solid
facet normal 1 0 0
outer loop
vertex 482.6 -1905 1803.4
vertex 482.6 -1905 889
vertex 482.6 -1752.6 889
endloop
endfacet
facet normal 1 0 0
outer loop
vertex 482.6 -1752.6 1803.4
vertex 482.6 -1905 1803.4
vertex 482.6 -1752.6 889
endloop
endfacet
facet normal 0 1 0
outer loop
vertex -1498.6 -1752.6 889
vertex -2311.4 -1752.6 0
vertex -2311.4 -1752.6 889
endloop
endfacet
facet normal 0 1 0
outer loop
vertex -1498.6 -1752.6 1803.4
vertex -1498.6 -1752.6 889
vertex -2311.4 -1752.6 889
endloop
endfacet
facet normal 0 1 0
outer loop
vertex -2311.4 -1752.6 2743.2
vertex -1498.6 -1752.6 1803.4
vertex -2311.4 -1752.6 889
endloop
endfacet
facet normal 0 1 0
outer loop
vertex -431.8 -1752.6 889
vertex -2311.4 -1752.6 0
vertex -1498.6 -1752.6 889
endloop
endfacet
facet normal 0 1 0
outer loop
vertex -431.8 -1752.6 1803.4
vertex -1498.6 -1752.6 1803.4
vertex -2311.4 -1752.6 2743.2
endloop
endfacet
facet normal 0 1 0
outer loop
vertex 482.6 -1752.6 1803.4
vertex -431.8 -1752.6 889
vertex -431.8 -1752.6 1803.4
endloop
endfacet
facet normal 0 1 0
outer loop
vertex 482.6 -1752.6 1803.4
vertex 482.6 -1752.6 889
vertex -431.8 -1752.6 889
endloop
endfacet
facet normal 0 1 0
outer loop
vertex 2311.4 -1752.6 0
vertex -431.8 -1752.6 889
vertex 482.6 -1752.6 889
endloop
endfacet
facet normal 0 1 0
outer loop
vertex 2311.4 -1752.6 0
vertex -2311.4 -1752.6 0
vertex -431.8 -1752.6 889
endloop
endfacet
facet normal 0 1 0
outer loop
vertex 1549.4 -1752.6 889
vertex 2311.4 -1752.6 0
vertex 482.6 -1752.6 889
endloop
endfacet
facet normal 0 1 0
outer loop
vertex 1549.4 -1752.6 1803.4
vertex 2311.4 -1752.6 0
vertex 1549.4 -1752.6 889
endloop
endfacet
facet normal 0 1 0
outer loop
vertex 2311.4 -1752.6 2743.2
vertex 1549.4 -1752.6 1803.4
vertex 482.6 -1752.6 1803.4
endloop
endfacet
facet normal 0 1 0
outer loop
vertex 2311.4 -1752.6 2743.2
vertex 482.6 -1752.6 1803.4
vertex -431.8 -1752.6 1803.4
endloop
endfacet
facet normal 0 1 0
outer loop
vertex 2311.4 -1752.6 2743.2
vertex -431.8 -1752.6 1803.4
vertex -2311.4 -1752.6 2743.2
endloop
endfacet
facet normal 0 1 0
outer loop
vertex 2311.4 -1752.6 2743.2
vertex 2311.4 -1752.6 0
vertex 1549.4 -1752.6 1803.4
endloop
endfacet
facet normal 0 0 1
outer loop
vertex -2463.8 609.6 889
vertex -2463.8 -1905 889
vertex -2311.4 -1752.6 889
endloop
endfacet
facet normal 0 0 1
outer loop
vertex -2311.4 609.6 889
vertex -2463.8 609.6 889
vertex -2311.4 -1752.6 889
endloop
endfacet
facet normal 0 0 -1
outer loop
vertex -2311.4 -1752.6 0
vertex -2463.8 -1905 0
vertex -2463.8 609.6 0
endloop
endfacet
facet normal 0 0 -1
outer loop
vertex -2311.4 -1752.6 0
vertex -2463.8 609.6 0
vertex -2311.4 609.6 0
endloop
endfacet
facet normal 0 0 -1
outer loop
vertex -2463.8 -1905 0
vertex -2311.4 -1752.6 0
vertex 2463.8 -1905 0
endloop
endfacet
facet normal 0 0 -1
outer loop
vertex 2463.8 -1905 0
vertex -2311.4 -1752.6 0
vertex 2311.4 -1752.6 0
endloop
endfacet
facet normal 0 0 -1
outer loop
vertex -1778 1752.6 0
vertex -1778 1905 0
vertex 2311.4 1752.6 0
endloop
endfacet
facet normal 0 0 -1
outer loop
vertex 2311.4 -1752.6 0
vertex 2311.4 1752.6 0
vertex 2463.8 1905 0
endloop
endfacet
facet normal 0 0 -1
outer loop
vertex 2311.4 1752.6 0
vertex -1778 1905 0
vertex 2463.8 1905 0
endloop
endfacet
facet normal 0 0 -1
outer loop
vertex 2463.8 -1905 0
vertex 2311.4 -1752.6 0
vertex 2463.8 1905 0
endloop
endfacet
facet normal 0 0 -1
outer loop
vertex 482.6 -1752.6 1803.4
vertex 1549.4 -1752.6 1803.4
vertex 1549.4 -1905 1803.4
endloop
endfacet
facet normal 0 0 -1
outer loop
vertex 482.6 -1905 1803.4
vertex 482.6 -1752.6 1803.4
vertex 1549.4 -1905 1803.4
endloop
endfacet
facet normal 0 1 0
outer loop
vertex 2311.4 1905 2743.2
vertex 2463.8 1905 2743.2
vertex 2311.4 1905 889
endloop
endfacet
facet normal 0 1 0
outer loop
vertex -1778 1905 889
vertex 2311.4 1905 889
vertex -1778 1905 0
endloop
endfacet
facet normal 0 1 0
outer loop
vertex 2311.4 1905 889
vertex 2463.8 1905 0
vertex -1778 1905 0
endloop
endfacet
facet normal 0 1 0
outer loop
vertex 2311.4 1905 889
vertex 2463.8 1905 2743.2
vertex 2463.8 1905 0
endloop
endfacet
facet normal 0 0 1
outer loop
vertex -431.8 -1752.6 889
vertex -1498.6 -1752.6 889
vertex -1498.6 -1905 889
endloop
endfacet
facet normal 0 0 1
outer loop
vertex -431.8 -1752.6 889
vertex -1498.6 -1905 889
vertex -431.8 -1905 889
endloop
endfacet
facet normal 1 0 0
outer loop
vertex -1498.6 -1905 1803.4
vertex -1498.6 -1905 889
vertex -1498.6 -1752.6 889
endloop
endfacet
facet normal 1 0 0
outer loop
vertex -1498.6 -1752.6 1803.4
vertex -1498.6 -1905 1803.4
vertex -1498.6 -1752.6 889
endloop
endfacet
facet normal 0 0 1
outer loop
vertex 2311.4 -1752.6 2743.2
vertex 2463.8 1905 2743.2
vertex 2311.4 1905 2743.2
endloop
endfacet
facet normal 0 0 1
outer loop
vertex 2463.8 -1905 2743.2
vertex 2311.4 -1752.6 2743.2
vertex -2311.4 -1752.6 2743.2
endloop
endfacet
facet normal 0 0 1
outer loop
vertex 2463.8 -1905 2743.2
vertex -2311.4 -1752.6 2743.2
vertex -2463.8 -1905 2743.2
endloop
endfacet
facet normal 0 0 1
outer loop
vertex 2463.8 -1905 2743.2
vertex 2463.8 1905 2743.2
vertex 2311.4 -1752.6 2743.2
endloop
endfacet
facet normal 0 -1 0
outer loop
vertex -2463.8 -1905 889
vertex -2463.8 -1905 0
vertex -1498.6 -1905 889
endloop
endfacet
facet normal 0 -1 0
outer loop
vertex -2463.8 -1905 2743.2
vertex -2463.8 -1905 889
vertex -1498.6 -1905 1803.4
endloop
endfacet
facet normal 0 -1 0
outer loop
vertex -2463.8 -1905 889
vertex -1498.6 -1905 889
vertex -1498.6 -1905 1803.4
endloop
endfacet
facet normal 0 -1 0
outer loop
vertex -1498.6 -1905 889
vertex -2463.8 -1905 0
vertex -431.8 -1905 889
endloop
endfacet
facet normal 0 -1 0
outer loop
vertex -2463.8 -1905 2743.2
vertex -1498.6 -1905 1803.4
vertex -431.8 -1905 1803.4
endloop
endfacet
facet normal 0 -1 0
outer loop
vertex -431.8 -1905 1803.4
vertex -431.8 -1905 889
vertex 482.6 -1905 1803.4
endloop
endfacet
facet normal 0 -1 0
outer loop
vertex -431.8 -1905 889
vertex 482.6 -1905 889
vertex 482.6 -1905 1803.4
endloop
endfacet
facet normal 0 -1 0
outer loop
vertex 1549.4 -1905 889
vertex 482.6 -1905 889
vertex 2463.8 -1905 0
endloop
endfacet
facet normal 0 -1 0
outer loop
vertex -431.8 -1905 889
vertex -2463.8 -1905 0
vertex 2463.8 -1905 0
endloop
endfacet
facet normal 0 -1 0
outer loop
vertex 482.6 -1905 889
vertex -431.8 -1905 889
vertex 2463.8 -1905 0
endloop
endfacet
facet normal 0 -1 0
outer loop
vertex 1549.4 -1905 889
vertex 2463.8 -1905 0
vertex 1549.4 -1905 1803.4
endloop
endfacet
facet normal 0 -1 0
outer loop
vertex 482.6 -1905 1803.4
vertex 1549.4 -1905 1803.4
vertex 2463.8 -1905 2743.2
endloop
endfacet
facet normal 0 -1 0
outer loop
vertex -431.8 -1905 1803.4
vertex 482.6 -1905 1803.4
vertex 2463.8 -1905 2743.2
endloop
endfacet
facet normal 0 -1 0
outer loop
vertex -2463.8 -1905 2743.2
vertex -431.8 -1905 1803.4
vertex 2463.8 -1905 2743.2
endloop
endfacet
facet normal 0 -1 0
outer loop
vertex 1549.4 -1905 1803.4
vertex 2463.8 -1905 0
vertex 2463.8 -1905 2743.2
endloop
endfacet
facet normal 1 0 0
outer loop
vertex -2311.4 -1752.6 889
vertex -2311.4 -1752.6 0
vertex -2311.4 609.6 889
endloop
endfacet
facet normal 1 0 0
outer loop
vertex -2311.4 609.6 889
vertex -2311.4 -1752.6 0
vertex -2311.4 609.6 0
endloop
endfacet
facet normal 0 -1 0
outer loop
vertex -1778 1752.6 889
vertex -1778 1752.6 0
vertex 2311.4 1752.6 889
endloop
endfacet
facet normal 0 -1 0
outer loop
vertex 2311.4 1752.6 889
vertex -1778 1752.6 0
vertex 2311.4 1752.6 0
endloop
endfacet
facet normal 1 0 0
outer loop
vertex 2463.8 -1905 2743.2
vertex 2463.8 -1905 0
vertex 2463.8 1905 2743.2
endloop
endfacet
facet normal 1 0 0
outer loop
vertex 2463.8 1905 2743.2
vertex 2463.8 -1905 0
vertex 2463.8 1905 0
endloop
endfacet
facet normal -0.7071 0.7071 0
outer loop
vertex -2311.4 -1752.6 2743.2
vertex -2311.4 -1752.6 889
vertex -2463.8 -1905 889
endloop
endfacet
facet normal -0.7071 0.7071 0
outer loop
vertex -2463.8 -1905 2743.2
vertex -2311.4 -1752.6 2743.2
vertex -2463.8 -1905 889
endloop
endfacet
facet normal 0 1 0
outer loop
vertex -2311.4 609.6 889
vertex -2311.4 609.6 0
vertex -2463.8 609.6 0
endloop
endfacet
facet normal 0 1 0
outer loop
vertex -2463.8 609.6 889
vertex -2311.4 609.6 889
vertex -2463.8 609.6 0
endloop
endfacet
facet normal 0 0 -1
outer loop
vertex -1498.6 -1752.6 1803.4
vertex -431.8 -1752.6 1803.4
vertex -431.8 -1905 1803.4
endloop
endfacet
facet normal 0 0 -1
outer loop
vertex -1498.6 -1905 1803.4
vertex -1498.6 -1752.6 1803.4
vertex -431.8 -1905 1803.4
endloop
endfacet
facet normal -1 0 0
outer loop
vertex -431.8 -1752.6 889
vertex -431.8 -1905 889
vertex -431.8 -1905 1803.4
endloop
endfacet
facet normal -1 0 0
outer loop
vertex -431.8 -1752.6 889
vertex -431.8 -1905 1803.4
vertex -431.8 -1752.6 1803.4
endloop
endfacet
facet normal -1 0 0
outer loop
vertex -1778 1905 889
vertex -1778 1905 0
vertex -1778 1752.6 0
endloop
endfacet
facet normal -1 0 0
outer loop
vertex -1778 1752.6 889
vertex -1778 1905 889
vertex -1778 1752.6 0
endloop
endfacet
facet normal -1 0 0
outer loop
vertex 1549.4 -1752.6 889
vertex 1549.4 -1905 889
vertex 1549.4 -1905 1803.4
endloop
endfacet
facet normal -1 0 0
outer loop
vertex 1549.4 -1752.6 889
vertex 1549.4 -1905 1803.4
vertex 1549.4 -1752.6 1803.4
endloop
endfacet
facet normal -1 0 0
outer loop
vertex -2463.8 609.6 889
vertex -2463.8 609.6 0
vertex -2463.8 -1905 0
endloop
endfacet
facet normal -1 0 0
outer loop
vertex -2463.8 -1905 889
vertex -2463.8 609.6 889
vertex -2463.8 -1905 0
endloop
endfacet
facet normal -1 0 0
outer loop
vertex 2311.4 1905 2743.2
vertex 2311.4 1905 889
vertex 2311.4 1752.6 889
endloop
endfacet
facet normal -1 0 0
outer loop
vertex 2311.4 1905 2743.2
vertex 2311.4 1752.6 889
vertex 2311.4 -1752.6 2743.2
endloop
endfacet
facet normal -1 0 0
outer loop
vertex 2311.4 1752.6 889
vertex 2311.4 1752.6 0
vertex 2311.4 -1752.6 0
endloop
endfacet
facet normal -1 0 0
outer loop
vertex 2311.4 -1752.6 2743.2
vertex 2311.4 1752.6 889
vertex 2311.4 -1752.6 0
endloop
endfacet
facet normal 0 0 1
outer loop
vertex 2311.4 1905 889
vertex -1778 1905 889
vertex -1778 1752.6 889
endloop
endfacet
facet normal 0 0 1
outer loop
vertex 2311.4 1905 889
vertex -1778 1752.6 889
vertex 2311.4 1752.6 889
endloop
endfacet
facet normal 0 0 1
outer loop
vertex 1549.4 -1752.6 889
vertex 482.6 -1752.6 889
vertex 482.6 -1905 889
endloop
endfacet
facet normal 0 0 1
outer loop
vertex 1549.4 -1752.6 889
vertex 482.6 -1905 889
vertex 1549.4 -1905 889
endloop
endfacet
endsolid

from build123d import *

# Parameters (mm, degrees)
F1_DEPTH  = 889
F3_DEPTH  = 2159
F4_W      = 762
F4_H      = 152.4
F4_W_2    = 914.4
F5_DEPTH  = 2159
F6_W      = 152.4
F6_H      = 1244.6
F7_DEPTH  = 1066.8
F8_W      = 152.4
F8_H      = 1244.6
F9_DEPTH  = 1066.8
F10_DEPTH = 304.8


with BuildPart() as f1:
    # F0 (on Top) → F1 (new body)
    with BuildSketch(Plane.XY):
        Polygon((-1778, 1752.6), (2311.4, 1752.6), (2311.4, -1752.6), (-2311.4, -1752.6), (-2311.4, 609.6), (-2463.8, 609.6), (-2463.8, -1752.6), (-2463.8, -1905), (-2311.4, -1905), (2311.4, -1905), (2463.8, -1905), (2463.8, 1752.6), (2463.8, 1905), (2311.4, 1905), (-1778, 1905), align=None)
    extrude(amount=F1_DEPTH)

    # F2 (on face) → F3 (join)
    with BuildSketch(Plane.XY.offset(889)):
        Polygon((2311.4, 1905), (2311.4, 1752.6), (2311.4, -1752.6), (2311.4, -1905), (2463.8, -1905), (2463.8, 1905), align=None)
    extrude(amount=F3_DEPTH)

    # F4 (on face) → F5 (join)
    with BuildSketch(Plane.XY.offset(889)):
        with Locations((1930.4, -1828.8)):
            Rectangle(F4_W, F4_H)
        with Locations((25.4, -1828.8)):
            Rectangle(F4_W_2, F4_H)
        Polygon((-2463.8, -1905), (-1498.6, -1905), (-1498.6, -1752.6), (-2311.4, -1752.6), align=None)
    extrude(amount=F5_DEPTH)

    # F6 (on face) → F7 (join, through all)
    with BuildSketch(Plane(origin=(1549.4, 0, 0), x_dir=(0, -1, 0), z_dir=(-1, 0, 0))):
        with Locations((1828.8, 2425.7)):
            Rectangle(F6_W, F6_H)
    extrude(amount=F7_DEPTH)

    # F8 (on face) → F9 (join, through all)
    with BuildSketch(Plane(origin=(-431.8, 0, 0), x_dir=(0, -1, 0), z_dir=(-1, 0, 0))):
        with Locations((1828.8, 2425.7)):
            Rectangle(F8_W, F8_H)
    extrude(amount=F9_DEPTH)

    # F10 (cut): a face of the model
    f10_faces = [f1.faces().sort_by_distance(p)[0] for p in [
        (2373.6875121995, 76.2, 3048),
    ]]
    extrude(f10_faces, amount=-F10_DEPTH, mode=Mode.SUBTRACT)


solid = f1.part
